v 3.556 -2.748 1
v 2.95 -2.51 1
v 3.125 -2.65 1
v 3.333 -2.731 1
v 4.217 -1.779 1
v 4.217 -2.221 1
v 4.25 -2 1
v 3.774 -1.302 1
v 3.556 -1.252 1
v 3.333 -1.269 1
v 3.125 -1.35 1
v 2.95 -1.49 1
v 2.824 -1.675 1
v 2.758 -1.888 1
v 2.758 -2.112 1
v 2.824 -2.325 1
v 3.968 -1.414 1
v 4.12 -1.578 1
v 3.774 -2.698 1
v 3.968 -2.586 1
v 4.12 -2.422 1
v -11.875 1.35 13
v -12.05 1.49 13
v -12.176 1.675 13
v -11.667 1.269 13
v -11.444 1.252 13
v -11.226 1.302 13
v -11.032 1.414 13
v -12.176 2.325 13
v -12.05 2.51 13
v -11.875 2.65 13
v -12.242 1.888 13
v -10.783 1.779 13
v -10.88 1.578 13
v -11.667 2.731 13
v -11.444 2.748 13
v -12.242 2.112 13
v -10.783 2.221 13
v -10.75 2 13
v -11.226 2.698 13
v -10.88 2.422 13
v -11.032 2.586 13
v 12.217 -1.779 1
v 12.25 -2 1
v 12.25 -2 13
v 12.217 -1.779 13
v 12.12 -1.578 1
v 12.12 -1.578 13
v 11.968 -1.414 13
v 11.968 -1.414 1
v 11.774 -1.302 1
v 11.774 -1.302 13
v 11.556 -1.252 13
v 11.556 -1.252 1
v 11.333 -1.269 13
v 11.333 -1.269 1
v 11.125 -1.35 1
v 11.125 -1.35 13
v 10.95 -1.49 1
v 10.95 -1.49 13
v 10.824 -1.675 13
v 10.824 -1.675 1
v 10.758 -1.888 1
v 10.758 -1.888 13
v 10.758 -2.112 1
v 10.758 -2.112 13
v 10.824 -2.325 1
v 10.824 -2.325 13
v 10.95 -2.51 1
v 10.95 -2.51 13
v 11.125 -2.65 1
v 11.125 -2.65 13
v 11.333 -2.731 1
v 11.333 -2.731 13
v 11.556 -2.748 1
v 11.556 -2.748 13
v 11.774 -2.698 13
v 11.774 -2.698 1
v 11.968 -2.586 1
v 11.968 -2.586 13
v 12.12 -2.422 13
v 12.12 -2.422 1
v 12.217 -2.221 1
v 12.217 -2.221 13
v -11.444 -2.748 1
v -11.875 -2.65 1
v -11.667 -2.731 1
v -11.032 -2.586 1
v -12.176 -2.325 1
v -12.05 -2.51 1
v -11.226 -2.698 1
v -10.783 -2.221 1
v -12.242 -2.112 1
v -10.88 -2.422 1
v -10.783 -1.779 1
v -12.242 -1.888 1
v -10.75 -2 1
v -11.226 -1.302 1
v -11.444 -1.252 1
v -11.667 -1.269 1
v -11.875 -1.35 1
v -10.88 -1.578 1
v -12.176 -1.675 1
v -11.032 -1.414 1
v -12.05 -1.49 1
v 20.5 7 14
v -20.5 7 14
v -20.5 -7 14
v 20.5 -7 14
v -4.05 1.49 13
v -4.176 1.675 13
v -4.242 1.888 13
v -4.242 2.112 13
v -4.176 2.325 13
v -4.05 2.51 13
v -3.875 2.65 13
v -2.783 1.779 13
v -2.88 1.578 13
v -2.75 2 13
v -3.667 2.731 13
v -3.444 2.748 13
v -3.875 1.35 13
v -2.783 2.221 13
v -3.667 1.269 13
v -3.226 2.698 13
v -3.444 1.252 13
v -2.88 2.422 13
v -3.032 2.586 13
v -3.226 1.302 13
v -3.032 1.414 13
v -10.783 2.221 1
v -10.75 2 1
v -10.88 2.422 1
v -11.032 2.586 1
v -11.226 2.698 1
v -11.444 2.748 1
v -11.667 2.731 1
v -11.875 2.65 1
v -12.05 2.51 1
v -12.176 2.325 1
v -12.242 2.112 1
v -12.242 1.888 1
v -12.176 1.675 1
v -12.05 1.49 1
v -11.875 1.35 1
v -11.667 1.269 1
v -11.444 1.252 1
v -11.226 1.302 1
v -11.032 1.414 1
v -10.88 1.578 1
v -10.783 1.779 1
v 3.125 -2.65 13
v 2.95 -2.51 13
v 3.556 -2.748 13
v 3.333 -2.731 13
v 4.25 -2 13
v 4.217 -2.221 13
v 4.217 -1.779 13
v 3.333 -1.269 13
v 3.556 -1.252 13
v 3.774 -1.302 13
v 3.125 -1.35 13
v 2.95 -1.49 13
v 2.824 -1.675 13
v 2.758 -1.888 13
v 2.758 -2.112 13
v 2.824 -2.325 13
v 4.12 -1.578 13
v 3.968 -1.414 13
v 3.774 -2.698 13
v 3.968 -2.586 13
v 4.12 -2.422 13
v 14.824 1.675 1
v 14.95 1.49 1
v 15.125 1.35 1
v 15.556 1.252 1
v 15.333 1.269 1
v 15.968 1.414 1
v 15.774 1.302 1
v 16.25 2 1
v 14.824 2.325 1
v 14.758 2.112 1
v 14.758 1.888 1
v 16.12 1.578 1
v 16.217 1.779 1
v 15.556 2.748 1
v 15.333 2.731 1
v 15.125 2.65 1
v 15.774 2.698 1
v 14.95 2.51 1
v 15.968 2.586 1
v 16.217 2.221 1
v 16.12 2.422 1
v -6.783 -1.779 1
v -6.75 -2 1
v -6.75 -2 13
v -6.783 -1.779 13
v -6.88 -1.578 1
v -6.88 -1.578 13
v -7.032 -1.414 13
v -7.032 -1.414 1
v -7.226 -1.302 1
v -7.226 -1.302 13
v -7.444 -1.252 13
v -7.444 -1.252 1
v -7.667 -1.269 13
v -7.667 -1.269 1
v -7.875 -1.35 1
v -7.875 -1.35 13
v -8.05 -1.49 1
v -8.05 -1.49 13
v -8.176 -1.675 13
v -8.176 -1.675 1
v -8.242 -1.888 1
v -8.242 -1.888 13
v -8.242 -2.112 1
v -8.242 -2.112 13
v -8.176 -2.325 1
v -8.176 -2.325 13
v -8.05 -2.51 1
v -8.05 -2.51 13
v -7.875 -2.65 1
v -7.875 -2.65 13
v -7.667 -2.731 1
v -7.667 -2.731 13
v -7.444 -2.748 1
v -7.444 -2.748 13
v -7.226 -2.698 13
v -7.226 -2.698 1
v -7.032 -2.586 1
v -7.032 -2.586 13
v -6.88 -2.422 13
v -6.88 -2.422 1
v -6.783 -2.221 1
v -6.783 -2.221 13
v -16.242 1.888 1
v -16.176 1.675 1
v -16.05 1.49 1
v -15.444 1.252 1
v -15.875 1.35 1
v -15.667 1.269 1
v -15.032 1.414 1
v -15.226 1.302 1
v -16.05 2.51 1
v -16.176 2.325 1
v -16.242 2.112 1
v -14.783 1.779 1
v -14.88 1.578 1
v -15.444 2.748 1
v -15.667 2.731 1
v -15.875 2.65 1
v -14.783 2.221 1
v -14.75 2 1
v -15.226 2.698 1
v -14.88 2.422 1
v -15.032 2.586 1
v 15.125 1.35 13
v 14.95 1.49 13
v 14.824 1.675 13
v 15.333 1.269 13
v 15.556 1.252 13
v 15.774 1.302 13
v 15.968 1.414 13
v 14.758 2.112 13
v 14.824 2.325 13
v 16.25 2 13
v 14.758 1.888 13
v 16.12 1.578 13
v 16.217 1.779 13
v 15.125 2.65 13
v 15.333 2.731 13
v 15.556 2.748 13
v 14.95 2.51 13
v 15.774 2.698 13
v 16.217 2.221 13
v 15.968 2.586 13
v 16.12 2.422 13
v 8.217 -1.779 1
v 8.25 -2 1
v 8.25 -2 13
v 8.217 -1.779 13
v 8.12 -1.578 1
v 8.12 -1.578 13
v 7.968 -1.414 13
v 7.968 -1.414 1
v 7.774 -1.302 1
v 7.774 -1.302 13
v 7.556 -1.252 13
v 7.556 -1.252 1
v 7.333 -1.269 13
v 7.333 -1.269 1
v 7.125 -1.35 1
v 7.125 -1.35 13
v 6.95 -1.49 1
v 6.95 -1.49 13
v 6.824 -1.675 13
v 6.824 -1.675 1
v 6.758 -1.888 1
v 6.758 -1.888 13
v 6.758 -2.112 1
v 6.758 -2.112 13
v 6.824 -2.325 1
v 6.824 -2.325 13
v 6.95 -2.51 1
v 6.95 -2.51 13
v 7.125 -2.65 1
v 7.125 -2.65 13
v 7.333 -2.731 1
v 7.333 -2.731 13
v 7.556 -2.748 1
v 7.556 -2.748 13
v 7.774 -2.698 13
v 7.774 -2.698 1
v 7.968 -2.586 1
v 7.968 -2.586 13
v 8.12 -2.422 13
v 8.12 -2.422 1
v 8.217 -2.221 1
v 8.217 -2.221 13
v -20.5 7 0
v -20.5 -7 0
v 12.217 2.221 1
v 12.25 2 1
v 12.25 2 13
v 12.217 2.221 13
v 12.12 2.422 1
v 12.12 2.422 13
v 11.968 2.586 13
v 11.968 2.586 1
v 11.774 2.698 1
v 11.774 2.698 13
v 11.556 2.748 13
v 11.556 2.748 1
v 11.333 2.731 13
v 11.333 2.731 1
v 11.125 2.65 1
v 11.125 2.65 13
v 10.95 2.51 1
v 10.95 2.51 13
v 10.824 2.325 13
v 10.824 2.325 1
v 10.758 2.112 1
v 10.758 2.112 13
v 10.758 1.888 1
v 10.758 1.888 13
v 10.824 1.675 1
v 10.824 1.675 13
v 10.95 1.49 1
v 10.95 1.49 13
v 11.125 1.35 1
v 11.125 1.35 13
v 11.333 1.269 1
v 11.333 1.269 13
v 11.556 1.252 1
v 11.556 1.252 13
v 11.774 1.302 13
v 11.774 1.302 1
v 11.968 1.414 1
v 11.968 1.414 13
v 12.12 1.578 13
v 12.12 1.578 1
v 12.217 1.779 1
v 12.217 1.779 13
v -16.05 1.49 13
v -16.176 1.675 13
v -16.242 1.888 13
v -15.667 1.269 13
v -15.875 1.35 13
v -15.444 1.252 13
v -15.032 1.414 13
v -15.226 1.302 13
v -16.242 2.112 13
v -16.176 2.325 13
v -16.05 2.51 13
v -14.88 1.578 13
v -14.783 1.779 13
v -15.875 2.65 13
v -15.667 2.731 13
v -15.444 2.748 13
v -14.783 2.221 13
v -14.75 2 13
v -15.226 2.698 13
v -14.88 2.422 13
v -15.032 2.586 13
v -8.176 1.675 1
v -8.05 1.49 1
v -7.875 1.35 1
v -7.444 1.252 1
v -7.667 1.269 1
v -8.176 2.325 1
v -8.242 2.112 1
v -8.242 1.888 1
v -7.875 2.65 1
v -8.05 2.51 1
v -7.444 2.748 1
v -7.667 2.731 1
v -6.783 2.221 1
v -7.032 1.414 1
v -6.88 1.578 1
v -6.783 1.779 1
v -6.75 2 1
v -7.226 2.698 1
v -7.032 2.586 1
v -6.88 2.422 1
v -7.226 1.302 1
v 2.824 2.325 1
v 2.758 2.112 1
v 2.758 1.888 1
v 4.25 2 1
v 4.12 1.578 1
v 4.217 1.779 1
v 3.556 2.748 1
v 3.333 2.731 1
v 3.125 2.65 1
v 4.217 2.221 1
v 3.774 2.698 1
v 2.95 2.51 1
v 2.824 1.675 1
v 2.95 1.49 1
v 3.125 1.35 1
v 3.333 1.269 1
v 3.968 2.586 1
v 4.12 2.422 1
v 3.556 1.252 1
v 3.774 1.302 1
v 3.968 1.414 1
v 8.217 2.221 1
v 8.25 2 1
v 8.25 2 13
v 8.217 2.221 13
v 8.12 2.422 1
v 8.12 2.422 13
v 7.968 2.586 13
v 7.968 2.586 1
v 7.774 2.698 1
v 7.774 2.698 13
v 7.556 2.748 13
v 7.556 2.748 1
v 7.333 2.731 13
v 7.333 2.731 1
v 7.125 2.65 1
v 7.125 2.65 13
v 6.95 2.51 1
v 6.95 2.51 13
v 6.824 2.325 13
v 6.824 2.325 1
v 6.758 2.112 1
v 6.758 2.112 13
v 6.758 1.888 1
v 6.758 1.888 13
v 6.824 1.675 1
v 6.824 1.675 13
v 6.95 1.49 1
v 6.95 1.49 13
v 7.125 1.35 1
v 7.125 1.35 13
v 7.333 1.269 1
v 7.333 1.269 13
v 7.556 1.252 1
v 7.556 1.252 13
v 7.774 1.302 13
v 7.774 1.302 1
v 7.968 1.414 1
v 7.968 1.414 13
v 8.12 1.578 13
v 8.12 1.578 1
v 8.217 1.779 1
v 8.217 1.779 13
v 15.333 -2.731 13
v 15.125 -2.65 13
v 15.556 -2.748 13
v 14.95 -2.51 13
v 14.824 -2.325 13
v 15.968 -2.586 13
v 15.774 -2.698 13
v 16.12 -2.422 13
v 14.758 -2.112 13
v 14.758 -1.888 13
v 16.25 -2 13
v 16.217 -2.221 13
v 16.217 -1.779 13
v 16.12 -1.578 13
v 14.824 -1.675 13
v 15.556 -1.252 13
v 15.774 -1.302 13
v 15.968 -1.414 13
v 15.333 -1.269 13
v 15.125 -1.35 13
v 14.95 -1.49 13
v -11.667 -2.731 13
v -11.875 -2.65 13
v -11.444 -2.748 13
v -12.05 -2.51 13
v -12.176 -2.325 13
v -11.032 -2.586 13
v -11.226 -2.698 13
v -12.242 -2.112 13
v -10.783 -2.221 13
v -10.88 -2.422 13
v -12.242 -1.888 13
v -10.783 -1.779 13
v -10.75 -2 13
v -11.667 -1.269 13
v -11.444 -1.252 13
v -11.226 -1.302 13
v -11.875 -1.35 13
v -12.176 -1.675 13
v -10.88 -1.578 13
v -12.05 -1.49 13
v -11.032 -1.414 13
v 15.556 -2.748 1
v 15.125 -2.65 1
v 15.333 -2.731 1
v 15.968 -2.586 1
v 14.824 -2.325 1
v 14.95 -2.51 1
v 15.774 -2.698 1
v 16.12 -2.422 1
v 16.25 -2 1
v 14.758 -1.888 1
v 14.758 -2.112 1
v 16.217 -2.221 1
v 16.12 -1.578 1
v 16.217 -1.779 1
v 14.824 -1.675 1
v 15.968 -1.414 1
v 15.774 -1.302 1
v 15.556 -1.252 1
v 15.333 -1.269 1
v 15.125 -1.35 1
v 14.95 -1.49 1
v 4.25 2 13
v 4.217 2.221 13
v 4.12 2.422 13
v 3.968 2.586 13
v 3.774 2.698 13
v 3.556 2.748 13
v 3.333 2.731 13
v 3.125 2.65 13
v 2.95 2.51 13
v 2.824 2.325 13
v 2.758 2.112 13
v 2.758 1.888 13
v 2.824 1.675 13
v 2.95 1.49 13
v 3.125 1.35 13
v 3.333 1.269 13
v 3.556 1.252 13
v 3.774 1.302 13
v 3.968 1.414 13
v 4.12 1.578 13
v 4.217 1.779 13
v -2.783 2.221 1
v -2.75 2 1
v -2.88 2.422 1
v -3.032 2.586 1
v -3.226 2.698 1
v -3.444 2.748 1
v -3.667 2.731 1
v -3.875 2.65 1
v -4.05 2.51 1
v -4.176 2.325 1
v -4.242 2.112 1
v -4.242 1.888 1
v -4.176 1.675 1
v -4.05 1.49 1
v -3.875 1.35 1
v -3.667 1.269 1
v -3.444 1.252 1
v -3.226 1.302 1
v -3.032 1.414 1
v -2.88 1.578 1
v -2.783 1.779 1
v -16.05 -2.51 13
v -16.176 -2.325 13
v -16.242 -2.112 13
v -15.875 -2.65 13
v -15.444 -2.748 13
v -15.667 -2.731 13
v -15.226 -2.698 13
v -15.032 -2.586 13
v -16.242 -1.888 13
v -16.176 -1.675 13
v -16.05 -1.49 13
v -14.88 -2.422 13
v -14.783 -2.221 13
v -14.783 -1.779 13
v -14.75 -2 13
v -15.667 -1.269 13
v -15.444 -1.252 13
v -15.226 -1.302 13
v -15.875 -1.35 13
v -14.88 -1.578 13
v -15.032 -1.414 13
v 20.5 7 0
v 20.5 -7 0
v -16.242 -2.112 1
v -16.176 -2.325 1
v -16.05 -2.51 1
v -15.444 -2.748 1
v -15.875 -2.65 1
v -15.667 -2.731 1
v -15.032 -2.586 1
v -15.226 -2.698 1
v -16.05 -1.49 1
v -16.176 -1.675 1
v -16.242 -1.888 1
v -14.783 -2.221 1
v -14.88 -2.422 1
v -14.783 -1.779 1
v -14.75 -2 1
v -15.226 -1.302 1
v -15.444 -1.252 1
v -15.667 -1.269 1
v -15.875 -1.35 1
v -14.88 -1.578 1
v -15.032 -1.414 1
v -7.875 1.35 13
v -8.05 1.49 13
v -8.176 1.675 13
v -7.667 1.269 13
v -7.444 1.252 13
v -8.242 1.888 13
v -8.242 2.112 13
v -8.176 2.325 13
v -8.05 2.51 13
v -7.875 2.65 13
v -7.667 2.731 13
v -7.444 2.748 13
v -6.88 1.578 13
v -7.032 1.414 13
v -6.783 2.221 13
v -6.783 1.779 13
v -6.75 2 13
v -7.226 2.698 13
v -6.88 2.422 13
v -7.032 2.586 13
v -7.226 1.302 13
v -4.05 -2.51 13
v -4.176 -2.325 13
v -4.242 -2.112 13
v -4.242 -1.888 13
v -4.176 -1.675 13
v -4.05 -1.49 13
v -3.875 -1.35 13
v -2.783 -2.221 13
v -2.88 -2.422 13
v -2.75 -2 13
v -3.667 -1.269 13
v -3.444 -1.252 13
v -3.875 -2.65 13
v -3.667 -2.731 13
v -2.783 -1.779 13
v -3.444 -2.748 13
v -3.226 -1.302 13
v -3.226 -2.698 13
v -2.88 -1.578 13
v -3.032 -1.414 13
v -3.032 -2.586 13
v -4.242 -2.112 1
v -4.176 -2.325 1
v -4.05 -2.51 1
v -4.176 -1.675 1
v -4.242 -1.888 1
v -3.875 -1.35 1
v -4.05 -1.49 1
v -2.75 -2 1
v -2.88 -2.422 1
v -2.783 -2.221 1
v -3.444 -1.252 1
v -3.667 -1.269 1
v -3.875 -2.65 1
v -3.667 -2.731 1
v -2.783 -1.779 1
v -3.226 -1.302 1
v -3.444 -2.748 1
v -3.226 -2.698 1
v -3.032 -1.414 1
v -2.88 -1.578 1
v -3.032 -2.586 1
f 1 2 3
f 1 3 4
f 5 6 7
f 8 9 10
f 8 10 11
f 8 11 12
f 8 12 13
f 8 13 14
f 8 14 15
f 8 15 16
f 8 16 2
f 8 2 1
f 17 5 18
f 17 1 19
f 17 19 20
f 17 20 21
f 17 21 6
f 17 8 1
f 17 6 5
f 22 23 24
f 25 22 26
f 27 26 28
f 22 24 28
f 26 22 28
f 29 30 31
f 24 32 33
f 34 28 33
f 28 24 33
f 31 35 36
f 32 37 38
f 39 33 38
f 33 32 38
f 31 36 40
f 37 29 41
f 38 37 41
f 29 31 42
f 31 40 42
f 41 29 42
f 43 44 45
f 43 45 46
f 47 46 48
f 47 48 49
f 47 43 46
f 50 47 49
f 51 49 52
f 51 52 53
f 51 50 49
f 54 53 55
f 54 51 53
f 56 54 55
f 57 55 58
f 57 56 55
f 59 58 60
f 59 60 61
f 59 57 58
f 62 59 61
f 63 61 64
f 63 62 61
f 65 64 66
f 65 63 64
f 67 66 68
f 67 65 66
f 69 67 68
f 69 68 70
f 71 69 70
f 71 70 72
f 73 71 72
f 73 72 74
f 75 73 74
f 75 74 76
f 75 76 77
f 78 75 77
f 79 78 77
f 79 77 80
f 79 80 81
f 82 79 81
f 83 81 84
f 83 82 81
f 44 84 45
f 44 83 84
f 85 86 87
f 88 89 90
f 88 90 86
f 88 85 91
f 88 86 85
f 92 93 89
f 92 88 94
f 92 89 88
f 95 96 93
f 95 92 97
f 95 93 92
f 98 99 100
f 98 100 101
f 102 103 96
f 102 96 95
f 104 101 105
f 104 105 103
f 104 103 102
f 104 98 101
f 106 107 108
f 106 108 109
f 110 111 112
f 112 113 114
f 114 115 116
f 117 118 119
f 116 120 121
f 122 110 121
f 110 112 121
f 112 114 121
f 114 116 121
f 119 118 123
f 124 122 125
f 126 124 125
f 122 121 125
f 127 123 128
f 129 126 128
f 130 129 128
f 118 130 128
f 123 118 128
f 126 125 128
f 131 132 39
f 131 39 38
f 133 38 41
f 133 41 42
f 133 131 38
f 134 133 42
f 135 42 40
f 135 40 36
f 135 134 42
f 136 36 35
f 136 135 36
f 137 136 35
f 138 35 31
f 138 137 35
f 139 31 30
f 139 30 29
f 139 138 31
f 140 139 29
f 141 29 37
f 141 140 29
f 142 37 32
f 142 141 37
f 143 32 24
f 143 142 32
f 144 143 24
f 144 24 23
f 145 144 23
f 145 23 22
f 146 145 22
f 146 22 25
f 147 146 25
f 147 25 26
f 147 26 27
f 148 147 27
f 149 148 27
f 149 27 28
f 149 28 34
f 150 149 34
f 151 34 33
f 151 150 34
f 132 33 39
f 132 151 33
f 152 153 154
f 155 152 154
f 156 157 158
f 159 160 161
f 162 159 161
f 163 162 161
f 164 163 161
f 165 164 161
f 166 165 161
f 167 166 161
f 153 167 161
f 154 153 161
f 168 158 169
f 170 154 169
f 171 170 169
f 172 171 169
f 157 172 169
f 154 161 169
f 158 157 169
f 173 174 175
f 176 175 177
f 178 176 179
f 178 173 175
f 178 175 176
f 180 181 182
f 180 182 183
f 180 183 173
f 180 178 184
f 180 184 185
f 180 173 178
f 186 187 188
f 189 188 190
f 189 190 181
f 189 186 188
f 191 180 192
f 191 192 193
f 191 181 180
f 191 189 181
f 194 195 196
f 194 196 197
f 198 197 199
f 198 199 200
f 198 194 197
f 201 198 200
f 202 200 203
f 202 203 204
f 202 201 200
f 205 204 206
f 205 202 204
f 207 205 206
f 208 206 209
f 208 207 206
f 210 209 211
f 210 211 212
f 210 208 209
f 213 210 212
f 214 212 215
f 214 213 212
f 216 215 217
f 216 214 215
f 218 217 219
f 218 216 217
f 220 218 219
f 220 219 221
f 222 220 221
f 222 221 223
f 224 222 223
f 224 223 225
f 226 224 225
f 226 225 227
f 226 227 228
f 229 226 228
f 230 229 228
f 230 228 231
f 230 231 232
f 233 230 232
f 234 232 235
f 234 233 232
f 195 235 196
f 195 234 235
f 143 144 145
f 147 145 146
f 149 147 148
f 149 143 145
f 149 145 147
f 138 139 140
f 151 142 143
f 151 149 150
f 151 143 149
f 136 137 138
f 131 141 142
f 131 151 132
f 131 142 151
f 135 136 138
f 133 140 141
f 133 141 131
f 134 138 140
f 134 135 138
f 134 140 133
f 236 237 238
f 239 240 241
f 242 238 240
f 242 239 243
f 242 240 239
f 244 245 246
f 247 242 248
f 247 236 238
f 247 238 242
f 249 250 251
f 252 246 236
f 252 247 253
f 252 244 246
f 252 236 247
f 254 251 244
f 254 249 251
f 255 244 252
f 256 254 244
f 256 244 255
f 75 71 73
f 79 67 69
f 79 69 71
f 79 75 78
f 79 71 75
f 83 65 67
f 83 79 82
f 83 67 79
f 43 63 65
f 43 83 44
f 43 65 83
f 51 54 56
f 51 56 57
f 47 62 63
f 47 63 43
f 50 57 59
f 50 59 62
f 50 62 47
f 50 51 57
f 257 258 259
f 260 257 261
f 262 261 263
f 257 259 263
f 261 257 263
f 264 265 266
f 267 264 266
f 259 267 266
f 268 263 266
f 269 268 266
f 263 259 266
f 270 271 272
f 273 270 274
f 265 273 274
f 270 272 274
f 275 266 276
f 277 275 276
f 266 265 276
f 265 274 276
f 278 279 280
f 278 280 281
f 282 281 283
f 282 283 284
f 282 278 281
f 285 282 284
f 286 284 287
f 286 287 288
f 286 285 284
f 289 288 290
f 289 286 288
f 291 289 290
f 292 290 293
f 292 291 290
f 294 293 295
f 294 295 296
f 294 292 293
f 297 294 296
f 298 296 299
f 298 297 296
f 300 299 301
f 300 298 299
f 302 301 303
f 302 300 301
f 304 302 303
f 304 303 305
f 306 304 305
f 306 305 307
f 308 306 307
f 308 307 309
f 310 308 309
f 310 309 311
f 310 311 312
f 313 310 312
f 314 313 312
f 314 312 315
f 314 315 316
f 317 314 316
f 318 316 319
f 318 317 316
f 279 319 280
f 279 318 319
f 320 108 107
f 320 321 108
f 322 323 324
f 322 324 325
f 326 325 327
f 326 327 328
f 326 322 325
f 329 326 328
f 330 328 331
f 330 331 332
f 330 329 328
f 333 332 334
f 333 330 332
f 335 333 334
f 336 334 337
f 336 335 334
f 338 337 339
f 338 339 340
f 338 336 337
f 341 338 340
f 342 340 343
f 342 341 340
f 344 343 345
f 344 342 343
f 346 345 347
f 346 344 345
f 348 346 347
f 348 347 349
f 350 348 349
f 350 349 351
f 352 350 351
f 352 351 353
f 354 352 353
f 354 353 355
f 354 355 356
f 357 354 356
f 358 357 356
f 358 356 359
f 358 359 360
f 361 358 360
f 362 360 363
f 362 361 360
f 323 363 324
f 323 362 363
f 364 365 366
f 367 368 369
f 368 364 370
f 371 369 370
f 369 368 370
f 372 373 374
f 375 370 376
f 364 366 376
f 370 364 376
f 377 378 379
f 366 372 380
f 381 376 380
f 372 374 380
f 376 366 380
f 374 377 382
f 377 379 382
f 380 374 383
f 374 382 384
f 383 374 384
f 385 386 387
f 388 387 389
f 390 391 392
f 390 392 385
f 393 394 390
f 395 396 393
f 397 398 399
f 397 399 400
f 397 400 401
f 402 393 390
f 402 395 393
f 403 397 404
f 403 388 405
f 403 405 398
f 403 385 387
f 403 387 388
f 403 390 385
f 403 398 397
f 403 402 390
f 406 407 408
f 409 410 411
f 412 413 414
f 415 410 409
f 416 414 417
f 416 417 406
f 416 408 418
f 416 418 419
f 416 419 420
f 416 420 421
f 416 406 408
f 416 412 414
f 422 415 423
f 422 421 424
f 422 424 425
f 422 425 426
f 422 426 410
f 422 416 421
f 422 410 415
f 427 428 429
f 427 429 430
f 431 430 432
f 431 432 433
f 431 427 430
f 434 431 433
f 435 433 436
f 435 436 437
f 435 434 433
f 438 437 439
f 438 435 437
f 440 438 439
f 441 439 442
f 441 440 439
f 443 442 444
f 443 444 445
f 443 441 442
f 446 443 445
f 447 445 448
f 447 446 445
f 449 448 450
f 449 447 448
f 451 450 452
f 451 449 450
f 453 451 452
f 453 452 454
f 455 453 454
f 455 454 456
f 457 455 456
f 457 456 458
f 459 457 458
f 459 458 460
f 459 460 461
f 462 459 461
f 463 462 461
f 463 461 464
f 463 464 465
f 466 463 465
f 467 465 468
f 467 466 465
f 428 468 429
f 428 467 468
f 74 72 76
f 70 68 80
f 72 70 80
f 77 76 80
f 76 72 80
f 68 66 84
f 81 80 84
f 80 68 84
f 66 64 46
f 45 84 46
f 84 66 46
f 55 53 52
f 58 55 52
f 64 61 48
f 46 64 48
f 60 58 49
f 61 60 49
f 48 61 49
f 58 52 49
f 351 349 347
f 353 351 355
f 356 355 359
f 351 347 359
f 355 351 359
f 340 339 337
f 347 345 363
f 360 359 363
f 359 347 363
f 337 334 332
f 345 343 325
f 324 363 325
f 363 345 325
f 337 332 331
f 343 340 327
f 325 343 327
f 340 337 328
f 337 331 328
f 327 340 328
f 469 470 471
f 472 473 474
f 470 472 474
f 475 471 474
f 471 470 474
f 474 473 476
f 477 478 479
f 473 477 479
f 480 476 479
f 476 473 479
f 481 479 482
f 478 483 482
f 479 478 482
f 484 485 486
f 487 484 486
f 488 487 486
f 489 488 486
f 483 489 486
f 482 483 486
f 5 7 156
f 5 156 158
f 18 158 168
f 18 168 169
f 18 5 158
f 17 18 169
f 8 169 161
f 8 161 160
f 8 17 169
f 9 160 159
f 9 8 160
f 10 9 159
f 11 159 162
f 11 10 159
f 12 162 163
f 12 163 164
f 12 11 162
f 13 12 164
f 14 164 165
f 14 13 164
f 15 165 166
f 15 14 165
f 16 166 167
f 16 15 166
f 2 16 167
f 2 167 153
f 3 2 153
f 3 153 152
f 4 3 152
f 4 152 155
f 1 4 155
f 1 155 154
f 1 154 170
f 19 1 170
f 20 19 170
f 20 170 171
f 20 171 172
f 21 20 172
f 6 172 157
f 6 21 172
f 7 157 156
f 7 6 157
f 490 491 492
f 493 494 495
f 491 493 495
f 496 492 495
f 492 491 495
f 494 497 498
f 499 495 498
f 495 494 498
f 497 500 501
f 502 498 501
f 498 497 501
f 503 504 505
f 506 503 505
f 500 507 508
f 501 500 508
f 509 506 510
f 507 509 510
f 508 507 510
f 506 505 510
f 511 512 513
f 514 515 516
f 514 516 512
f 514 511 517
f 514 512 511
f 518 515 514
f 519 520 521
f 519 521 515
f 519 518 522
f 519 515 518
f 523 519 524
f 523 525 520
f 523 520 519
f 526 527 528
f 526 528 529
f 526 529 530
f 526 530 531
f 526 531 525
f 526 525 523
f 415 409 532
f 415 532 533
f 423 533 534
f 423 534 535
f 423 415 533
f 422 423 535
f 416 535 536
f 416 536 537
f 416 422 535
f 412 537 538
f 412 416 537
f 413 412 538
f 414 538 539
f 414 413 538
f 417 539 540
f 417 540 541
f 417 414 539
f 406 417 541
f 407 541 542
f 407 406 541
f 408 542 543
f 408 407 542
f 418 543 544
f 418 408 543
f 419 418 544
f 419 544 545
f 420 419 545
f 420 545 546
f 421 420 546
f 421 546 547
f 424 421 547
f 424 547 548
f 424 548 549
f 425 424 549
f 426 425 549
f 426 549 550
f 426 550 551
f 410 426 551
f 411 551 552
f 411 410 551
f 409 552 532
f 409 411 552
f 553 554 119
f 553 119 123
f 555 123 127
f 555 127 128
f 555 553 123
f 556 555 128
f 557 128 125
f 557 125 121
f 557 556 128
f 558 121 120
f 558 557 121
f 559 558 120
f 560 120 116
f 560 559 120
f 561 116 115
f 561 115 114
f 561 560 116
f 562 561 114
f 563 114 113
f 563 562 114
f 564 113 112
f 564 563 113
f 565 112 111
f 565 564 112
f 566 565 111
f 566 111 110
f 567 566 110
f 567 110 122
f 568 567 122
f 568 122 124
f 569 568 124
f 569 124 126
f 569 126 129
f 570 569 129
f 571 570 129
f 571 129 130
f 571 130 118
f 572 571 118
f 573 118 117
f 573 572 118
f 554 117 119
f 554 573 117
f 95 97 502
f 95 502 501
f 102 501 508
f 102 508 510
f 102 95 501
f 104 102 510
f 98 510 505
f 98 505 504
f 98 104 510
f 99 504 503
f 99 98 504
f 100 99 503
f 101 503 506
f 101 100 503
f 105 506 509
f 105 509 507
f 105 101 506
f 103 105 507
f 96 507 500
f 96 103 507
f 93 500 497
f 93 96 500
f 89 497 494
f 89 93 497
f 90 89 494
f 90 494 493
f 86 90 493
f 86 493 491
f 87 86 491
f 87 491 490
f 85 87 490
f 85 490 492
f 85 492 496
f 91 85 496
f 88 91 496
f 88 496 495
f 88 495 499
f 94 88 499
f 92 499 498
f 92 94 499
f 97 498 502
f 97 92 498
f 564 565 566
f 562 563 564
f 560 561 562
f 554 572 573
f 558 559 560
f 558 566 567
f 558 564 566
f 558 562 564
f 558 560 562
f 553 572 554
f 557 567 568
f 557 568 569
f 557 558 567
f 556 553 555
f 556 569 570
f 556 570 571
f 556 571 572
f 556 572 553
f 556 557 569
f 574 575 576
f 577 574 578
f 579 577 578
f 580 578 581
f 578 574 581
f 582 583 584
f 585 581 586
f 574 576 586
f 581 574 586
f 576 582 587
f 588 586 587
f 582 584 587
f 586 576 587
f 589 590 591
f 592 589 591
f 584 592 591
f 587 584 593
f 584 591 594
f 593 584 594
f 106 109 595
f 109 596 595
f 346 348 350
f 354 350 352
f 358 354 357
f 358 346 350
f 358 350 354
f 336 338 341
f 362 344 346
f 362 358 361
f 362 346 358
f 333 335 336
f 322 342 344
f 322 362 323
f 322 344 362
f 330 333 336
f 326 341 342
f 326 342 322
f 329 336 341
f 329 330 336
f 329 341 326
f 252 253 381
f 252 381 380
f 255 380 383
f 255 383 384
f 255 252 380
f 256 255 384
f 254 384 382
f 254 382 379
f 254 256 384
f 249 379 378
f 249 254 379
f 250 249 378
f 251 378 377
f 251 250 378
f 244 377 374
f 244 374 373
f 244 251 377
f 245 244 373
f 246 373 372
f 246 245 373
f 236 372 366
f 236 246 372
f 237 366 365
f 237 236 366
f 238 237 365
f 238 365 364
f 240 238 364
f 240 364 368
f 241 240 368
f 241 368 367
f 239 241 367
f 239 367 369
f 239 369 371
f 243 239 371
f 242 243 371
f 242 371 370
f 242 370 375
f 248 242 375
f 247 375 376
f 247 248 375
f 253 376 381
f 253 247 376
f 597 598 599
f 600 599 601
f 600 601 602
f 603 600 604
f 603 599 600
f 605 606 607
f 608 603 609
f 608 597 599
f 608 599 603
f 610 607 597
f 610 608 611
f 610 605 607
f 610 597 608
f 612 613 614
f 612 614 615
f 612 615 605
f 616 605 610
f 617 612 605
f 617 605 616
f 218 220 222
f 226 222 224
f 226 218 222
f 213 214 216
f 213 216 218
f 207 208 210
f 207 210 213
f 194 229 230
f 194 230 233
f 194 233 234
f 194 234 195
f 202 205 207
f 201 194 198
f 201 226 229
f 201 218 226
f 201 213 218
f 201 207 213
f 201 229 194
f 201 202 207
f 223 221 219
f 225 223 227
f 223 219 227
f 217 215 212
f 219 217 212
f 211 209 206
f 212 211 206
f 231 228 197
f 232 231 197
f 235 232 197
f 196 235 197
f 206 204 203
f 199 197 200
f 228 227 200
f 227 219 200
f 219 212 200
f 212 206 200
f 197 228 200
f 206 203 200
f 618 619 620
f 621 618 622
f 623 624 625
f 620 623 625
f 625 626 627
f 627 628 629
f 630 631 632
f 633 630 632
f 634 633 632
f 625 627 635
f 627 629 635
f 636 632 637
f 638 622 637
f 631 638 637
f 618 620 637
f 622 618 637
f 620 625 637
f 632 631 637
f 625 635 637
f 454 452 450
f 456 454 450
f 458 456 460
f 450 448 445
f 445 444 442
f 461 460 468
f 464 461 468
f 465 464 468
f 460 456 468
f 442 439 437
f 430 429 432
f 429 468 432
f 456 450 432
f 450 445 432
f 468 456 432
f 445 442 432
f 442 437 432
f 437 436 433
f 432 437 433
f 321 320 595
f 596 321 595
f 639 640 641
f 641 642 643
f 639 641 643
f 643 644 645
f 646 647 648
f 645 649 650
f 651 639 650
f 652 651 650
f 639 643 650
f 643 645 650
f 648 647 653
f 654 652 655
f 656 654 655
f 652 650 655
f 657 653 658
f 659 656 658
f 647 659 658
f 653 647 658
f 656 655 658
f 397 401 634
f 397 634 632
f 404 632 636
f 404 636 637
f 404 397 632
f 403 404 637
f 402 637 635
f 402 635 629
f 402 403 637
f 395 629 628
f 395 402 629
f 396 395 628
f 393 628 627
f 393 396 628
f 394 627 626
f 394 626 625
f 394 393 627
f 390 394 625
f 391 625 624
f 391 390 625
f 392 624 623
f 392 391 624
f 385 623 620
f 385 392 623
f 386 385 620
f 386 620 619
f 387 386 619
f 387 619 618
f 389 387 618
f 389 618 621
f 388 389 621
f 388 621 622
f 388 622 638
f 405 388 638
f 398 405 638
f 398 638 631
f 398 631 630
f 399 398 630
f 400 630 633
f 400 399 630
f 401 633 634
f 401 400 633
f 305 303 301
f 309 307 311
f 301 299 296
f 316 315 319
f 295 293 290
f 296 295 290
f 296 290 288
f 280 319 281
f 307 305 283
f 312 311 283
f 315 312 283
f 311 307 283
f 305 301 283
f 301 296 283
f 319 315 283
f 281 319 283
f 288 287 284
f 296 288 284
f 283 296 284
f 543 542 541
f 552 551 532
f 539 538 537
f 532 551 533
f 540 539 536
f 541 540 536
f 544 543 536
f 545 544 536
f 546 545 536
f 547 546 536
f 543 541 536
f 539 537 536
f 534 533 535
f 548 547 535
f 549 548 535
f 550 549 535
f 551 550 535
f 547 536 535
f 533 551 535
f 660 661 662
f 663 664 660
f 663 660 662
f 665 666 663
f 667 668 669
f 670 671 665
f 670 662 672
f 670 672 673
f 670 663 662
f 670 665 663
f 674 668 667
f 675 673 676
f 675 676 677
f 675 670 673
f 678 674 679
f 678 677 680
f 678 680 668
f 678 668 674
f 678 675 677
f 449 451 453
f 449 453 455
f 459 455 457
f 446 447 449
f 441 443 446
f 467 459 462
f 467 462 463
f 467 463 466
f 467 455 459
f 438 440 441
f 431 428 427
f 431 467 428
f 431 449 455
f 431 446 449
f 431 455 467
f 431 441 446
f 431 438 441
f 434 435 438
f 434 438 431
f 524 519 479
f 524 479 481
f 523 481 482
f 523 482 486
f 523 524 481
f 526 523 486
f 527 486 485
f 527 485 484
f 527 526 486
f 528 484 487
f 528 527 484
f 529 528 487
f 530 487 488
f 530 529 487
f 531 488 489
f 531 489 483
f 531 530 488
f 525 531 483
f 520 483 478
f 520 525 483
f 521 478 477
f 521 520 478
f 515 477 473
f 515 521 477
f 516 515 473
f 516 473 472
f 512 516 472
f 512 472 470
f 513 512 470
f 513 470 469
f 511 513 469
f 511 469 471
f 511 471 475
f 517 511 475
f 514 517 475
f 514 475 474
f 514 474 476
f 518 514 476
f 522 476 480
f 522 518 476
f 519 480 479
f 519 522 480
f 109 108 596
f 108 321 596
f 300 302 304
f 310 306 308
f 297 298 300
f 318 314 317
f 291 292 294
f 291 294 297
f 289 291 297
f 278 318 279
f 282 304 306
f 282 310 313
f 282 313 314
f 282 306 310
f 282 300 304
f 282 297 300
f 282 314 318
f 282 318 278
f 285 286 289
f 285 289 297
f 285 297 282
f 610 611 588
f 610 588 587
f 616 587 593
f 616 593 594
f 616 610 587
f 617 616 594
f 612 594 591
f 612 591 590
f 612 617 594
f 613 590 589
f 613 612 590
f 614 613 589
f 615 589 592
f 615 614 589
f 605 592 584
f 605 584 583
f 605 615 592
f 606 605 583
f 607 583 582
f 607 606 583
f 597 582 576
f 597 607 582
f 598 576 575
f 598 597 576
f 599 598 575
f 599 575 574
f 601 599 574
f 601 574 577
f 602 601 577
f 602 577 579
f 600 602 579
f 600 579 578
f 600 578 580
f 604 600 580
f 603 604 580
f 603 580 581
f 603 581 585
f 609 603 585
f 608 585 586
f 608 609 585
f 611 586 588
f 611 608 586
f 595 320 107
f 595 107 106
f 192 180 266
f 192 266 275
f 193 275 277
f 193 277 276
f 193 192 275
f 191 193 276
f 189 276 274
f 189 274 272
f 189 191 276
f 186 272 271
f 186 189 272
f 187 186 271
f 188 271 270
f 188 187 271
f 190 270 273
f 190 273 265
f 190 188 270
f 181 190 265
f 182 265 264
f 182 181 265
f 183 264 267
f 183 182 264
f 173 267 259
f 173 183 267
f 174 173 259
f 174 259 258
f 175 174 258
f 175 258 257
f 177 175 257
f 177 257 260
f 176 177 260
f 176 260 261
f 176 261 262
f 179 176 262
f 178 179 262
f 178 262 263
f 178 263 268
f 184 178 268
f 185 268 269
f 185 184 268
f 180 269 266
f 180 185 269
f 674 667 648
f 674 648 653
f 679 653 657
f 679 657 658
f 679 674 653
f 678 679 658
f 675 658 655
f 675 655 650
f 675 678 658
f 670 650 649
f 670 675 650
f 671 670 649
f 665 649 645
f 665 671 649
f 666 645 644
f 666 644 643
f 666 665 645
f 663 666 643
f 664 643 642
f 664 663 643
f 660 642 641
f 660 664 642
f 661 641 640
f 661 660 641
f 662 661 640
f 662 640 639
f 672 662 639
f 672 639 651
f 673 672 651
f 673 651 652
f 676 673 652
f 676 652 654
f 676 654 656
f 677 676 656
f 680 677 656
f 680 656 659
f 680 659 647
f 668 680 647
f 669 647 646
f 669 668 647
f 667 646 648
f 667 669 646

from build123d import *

# Parameters (mm, degrees)
F0_W     = 41
F0_H     = 14
F1_DEPTH = 1
F2_W     = 41
F2_H     = 14
F2_W_2   = 39
F2_H_2   = 12
F3_DEPTH = 12
F2_R     = 0.75
F4_DEPTH = 12
F5_W     = 41
F5_H     = 14
F6_DEPTH = 1


with BuildPart() as f1:
    # F0 (on Top) → F1 (new body)
    with BuildSketch(Plane.XY):
        Rectangle(F0_W, F0_H)
    extrude(amount=F1_DEPTH)

    # F2 (on face) → F3 (join)
    with BuildSketch(Plane.XY.offset(1)):
        Rectangle(F2_W, F2_H)
        Rectangle(F2_W_2, F2_H_2, mode=Mode.SUBTRACT)
    extrude(amount=F3_DEPTH)

    # F2 (on face) → F4 (join)
    with BuildSketch(Plane.XY.offset(1)):
        Rectangle(F2_W_2, F2_H_2)
        with Locations((-15.5, -2)):
            Circle(F2_R, mode=Mode.SUBTRACT)
        with Locations((-11.5, -2)):
            Circle(F2_R, mode=Mode.SUBTRACT)
        with Locations((-7.5, -2)):
            Circle(F2_R, mode=Mode.SUBTRACT)
        with Locations((-3.5, -2)):
            Circle(F2_R, mode=Mode.SUBTRACT)
        with Locations((3.5, -2)):
            Circle(F2_R, mode=Mode.SUBTRACT)
        with Locations((7.5, -2)):
            Circle(F2_R, mode=Mode.SUBTRACT)
        with Locations((11.5, -2)):
            Circle(F2_R, mode=Mode.SUBTRACT)
        with Locations((15.5, -2)):
            Circle(F2_R, mode=Mode.SUBTRACT)
        with Locations((-15.5, 2)):
            Circle(F2_R, mode=Mode.SUBTRACT)
        with Locations((-11.5, 2)):
            Circle(F2_R, mode=Mode.SUBTRACT)
        with Locations((-7.5, 2)):
            Circle(F2_R, mode=Mode.SUBTRACT)
        with Locations((-3.5, 2)):
            Circle(F2_R, mode=Mode.SUBTRACT)
        with Locations((3.5, 2)):
            Circle(F2_R, mode=Mode.SUBTRACT)
        with Locations((7.5, 2)):
            Circle(F2_R, mode=Mode.SUBTRACT)
        with Locations((11.5, 2)):
            Circle(F2_R, mode=Mode.SUBTRACT)
        with Locations((15.5, 2)):
            Circle(F2_R, mode=Mode.SUBTRACT)
    extrude(amount=F4_DEPTH)

    # F5 (on face) → F6 (join)
    with BuildSketch(Plane.XY.offset(13)):
        Rectangle(F5_W, F5_H)
    extrude(amount=F6_DEPTH)


solid = f1.part
